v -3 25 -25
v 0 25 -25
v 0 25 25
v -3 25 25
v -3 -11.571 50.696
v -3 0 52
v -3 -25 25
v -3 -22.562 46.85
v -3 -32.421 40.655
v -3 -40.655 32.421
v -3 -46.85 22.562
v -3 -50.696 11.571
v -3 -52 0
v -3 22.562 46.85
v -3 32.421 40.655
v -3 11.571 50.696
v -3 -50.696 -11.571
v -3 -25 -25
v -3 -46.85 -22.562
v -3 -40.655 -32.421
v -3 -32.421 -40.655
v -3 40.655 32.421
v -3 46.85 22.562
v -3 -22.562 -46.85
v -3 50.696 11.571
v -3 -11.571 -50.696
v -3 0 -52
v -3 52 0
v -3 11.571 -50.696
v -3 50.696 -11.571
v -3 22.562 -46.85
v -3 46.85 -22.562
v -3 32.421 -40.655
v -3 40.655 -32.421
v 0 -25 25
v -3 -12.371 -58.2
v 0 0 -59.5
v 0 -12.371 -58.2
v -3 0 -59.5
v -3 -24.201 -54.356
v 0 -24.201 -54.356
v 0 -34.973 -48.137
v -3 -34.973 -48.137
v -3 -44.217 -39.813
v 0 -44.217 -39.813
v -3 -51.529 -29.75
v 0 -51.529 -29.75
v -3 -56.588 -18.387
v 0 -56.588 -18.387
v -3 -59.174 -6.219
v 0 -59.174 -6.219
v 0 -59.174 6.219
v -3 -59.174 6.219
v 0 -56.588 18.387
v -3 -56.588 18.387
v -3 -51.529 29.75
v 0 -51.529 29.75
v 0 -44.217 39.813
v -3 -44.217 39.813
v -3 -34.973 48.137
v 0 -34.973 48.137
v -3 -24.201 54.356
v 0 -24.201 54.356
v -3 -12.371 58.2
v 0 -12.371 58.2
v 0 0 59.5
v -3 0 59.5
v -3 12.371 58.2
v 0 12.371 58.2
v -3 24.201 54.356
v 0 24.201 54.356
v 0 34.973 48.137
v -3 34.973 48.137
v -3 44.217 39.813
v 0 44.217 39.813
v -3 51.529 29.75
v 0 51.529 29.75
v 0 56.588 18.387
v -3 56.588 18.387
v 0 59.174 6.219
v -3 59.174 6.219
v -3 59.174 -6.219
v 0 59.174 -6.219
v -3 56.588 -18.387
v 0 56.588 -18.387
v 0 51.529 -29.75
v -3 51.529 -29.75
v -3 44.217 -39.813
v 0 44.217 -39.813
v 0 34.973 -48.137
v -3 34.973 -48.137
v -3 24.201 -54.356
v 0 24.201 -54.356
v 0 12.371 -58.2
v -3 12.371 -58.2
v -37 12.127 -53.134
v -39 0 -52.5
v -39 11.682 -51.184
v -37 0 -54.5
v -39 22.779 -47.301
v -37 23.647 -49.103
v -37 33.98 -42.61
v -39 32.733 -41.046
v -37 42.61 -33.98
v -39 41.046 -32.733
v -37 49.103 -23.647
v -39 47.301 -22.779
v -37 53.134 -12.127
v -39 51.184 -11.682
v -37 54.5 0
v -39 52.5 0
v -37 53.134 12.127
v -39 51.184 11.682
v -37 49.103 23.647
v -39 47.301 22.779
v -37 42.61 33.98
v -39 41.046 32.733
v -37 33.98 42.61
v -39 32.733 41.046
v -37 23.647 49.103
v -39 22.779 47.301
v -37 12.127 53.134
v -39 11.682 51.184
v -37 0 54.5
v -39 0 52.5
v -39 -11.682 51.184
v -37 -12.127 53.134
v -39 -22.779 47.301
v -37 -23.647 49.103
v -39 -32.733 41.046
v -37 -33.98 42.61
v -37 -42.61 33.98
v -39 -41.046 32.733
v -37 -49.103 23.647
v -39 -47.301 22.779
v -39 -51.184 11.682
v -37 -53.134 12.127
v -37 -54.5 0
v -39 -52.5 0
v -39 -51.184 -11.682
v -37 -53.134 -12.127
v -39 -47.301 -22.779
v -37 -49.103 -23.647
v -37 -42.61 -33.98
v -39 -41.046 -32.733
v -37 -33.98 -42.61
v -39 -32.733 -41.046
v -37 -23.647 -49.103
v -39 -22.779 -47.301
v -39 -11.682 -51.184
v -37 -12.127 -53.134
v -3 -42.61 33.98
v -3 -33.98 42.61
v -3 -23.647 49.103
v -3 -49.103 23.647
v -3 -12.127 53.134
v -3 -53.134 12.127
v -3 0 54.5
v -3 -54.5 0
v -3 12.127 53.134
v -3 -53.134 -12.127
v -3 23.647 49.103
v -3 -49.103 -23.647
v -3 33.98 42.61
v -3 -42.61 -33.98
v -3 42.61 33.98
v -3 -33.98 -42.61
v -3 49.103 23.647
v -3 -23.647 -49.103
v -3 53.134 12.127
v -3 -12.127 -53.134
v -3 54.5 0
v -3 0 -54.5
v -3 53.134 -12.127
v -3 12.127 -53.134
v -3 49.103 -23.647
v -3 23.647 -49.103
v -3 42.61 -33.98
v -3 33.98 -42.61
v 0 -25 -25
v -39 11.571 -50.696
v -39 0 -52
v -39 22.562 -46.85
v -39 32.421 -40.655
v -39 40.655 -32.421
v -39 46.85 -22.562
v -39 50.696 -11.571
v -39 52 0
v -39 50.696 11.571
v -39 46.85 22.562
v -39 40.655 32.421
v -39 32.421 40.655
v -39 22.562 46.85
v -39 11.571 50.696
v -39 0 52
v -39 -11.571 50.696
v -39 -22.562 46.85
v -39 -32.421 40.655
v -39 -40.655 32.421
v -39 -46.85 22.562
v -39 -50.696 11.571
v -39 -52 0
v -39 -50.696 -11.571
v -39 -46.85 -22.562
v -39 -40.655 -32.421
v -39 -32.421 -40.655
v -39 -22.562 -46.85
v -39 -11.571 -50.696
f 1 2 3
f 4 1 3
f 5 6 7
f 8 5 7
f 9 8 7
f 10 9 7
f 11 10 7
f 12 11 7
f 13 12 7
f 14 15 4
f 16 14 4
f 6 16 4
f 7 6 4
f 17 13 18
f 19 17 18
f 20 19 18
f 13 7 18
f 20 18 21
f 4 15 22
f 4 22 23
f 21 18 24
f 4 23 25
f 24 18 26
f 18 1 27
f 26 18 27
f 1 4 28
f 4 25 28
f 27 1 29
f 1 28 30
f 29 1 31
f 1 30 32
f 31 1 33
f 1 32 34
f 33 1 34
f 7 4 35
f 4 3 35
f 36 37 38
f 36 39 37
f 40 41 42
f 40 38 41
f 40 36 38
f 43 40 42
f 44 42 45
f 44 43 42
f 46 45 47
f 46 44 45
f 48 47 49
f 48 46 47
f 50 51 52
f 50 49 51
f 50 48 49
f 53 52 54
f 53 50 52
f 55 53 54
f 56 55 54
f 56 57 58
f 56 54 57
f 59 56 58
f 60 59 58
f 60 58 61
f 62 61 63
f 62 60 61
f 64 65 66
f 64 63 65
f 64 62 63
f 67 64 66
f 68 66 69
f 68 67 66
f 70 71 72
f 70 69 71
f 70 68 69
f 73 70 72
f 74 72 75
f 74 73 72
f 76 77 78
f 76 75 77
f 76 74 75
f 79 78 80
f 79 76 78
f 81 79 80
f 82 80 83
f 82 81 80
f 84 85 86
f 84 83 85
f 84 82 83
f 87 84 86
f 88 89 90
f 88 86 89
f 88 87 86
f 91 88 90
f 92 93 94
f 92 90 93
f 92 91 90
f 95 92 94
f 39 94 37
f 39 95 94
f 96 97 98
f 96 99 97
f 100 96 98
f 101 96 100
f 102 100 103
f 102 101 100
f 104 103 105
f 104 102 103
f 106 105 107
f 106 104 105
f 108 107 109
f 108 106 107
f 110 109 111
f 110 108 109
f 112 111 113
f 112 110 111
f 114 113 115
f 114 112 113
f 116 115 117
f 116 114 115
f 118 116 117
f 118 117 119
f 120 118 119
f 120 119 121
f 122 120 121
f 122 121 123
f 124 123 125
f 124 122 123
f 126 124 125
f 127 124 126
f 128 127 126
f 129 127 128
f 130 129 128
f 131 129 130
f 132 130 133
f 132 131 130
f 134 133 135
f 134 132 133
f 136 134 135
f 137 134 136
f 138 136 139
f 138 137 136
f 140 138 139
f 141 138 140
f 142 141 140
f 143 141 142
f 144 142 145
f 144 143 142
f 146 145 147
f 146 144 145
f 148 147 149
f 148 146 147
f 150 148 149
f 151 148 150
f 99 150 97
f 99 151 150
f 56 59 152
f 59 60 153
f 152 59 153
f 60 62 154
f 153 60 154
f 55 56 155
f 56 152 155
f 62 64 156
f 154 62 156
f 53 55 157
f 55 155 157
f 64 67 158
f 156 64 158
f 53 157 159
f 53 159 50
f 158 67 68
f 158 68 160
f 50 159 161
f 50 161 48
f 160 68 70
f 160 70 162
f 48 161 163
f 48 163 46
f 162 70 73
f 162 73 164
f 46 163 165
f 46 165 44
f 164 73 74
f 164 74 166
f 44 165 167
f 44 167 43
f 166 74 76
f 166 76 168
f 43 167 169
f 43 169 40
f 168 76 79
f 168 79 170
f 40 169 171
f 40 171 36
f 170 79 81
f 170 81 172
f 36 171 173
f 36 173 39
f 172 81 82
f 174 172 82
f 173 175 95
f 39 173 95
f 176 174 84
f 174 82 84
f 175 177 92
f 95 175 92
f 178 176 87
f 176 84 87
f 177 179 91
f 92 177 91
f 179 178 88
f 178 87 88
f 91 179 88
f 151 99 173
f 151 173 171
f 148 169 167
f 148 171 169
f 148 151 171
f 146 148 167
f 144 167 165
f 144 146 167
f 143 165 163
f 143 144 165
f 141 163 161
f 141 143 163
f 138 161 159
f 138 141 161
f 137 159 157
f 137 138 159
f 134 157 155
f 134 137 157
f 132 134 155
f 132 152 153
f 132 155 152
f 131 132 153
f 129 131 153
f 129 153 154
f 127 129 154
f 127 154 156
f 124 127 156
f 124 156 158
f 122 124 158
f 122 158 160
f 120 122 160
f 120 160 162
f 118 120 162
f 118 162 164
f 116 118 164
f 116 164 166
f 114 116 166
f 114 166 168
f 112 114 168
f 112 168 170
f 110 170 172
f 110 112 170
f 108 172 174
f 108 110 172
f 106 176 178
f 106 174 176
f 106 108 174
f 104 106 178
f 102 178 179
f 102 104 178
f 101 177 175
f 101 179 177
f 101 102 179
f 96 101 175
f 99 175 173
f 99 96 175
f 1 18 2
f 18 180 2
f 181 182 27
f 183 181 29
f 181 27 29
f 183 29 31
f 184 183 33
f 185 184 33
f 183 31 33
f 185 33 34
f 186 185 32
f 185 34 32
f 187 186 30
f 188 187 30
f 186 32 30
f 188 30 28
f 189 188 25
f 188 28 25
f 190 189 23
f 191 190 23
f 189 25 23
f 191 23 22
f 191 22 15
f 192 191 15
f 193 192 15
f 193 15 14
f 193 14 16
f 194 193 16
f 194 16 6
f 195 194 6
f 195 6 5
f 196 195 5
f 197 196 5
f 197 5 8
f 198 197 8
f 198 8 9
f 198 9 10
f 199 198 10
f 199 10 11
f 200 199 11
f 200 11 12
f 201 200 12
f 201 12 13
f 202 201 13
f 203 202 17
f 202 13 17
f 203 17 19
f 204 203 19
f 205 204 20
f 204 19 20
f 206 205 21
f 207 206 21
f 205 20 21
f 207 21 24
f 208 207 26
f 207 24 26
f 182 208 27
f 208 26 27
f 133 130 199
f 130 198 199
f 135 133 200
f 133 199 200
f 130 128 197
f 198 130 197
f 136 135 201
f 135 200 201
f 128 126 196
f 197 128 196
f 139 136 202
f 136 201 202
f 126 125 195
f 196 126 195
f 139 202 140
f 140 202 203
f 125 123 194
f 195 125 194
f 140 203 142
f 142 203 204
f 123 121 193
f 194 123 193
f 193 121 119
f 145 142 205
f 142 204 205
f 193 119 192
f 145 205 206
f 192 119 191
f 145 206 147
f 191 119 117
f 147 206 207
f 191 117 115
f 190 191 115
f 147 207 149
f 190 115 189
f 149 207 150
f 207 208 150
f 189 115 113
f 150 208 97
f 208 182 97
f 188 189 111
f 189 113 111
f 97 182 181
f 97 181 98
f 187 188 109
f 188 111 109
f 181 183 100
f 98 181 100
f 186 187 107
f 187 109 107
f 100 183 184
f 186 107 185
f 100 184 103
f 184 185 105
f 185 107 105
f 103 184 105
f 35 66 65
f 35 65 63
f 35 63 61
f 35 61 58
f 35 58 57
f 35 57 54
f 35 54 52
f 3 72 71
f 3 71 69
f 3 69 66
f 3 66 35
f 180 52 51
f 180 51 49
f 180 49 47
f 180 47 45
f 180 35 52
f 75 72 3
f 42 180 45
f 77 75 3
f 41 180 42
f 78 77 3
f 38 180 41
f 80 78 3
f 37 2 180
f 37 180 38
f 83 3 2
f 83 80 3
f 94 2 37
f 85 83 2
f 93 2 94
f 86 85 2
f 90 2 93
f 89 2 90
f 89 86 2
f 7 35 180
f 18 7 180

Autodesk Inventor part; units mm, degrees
ref_plane "YZ Plane" through (0, 0, 0) normal (1, 0, 0) x (0, 1, 0)
ref_plane "XZ Plane" through (0, 0, 0) normal (0, 1, 0) x (-1, 0, 0)
ref_plane "XY Plane" through (0, 0, 0) normal (0, 0, 1) x (1, 0, 0)
sketch "Sketch1" plane through (0, 0, 0) normal (0, 1, 0) x (-1, 0, 0)
  line L0 (0, 0) -> (0, -59.5)
  line L1 (0, -59.5) -> (3, -59.5)
  line L2 (3, -59.5) -> (3, -54.5)
  line L3 (3, -54.5) -> (39, -54.5)
  line L4 (39, -54.5) -> (39, -52)
  line L5 (39, -52) -> (3, -52)
  line L6 (3, -52) -> (3, 0)
  line L7 (3, 0) -> (0, 0)
  dimension "d3" = 3
  dimension "d4" = 5
  dimension "d5" = 36
  dimension "d6" = 2.5
  dimension "d14" = 52
revolve "Revolution1" add sketch "Sketch1" angle 360 about axis through (-3, 0, 0) along (1, 0, 0)
chamfer "Chamfer1" distance 2 angle 45 1 edges at (-39, 0, 54.5)
sketch "Sketch4" plane through (0, 0, 0) normal (1, 0, 0) x (0, 0, -1)
  line L0 (-25, -25) -> (25, -25)
  line L1 (25, -25) -> (25, 25)
  line L2 (25, 25) -> (-25, 25)
  line L3 (-25, 25) -> (-25, -25)
  line L4 (-25, -25) -> (25, 25) construction
  line L5 (25, -25) -> (-25, 25) construction
  point P0 (0, 0)
  point P1 (0, 0)
  dimension "d20" = 50
extrude "Extrusion3" cut sketch "Sketch4" against normal blind 10
properties part number "aftPlug" material "PVC-Piping"
